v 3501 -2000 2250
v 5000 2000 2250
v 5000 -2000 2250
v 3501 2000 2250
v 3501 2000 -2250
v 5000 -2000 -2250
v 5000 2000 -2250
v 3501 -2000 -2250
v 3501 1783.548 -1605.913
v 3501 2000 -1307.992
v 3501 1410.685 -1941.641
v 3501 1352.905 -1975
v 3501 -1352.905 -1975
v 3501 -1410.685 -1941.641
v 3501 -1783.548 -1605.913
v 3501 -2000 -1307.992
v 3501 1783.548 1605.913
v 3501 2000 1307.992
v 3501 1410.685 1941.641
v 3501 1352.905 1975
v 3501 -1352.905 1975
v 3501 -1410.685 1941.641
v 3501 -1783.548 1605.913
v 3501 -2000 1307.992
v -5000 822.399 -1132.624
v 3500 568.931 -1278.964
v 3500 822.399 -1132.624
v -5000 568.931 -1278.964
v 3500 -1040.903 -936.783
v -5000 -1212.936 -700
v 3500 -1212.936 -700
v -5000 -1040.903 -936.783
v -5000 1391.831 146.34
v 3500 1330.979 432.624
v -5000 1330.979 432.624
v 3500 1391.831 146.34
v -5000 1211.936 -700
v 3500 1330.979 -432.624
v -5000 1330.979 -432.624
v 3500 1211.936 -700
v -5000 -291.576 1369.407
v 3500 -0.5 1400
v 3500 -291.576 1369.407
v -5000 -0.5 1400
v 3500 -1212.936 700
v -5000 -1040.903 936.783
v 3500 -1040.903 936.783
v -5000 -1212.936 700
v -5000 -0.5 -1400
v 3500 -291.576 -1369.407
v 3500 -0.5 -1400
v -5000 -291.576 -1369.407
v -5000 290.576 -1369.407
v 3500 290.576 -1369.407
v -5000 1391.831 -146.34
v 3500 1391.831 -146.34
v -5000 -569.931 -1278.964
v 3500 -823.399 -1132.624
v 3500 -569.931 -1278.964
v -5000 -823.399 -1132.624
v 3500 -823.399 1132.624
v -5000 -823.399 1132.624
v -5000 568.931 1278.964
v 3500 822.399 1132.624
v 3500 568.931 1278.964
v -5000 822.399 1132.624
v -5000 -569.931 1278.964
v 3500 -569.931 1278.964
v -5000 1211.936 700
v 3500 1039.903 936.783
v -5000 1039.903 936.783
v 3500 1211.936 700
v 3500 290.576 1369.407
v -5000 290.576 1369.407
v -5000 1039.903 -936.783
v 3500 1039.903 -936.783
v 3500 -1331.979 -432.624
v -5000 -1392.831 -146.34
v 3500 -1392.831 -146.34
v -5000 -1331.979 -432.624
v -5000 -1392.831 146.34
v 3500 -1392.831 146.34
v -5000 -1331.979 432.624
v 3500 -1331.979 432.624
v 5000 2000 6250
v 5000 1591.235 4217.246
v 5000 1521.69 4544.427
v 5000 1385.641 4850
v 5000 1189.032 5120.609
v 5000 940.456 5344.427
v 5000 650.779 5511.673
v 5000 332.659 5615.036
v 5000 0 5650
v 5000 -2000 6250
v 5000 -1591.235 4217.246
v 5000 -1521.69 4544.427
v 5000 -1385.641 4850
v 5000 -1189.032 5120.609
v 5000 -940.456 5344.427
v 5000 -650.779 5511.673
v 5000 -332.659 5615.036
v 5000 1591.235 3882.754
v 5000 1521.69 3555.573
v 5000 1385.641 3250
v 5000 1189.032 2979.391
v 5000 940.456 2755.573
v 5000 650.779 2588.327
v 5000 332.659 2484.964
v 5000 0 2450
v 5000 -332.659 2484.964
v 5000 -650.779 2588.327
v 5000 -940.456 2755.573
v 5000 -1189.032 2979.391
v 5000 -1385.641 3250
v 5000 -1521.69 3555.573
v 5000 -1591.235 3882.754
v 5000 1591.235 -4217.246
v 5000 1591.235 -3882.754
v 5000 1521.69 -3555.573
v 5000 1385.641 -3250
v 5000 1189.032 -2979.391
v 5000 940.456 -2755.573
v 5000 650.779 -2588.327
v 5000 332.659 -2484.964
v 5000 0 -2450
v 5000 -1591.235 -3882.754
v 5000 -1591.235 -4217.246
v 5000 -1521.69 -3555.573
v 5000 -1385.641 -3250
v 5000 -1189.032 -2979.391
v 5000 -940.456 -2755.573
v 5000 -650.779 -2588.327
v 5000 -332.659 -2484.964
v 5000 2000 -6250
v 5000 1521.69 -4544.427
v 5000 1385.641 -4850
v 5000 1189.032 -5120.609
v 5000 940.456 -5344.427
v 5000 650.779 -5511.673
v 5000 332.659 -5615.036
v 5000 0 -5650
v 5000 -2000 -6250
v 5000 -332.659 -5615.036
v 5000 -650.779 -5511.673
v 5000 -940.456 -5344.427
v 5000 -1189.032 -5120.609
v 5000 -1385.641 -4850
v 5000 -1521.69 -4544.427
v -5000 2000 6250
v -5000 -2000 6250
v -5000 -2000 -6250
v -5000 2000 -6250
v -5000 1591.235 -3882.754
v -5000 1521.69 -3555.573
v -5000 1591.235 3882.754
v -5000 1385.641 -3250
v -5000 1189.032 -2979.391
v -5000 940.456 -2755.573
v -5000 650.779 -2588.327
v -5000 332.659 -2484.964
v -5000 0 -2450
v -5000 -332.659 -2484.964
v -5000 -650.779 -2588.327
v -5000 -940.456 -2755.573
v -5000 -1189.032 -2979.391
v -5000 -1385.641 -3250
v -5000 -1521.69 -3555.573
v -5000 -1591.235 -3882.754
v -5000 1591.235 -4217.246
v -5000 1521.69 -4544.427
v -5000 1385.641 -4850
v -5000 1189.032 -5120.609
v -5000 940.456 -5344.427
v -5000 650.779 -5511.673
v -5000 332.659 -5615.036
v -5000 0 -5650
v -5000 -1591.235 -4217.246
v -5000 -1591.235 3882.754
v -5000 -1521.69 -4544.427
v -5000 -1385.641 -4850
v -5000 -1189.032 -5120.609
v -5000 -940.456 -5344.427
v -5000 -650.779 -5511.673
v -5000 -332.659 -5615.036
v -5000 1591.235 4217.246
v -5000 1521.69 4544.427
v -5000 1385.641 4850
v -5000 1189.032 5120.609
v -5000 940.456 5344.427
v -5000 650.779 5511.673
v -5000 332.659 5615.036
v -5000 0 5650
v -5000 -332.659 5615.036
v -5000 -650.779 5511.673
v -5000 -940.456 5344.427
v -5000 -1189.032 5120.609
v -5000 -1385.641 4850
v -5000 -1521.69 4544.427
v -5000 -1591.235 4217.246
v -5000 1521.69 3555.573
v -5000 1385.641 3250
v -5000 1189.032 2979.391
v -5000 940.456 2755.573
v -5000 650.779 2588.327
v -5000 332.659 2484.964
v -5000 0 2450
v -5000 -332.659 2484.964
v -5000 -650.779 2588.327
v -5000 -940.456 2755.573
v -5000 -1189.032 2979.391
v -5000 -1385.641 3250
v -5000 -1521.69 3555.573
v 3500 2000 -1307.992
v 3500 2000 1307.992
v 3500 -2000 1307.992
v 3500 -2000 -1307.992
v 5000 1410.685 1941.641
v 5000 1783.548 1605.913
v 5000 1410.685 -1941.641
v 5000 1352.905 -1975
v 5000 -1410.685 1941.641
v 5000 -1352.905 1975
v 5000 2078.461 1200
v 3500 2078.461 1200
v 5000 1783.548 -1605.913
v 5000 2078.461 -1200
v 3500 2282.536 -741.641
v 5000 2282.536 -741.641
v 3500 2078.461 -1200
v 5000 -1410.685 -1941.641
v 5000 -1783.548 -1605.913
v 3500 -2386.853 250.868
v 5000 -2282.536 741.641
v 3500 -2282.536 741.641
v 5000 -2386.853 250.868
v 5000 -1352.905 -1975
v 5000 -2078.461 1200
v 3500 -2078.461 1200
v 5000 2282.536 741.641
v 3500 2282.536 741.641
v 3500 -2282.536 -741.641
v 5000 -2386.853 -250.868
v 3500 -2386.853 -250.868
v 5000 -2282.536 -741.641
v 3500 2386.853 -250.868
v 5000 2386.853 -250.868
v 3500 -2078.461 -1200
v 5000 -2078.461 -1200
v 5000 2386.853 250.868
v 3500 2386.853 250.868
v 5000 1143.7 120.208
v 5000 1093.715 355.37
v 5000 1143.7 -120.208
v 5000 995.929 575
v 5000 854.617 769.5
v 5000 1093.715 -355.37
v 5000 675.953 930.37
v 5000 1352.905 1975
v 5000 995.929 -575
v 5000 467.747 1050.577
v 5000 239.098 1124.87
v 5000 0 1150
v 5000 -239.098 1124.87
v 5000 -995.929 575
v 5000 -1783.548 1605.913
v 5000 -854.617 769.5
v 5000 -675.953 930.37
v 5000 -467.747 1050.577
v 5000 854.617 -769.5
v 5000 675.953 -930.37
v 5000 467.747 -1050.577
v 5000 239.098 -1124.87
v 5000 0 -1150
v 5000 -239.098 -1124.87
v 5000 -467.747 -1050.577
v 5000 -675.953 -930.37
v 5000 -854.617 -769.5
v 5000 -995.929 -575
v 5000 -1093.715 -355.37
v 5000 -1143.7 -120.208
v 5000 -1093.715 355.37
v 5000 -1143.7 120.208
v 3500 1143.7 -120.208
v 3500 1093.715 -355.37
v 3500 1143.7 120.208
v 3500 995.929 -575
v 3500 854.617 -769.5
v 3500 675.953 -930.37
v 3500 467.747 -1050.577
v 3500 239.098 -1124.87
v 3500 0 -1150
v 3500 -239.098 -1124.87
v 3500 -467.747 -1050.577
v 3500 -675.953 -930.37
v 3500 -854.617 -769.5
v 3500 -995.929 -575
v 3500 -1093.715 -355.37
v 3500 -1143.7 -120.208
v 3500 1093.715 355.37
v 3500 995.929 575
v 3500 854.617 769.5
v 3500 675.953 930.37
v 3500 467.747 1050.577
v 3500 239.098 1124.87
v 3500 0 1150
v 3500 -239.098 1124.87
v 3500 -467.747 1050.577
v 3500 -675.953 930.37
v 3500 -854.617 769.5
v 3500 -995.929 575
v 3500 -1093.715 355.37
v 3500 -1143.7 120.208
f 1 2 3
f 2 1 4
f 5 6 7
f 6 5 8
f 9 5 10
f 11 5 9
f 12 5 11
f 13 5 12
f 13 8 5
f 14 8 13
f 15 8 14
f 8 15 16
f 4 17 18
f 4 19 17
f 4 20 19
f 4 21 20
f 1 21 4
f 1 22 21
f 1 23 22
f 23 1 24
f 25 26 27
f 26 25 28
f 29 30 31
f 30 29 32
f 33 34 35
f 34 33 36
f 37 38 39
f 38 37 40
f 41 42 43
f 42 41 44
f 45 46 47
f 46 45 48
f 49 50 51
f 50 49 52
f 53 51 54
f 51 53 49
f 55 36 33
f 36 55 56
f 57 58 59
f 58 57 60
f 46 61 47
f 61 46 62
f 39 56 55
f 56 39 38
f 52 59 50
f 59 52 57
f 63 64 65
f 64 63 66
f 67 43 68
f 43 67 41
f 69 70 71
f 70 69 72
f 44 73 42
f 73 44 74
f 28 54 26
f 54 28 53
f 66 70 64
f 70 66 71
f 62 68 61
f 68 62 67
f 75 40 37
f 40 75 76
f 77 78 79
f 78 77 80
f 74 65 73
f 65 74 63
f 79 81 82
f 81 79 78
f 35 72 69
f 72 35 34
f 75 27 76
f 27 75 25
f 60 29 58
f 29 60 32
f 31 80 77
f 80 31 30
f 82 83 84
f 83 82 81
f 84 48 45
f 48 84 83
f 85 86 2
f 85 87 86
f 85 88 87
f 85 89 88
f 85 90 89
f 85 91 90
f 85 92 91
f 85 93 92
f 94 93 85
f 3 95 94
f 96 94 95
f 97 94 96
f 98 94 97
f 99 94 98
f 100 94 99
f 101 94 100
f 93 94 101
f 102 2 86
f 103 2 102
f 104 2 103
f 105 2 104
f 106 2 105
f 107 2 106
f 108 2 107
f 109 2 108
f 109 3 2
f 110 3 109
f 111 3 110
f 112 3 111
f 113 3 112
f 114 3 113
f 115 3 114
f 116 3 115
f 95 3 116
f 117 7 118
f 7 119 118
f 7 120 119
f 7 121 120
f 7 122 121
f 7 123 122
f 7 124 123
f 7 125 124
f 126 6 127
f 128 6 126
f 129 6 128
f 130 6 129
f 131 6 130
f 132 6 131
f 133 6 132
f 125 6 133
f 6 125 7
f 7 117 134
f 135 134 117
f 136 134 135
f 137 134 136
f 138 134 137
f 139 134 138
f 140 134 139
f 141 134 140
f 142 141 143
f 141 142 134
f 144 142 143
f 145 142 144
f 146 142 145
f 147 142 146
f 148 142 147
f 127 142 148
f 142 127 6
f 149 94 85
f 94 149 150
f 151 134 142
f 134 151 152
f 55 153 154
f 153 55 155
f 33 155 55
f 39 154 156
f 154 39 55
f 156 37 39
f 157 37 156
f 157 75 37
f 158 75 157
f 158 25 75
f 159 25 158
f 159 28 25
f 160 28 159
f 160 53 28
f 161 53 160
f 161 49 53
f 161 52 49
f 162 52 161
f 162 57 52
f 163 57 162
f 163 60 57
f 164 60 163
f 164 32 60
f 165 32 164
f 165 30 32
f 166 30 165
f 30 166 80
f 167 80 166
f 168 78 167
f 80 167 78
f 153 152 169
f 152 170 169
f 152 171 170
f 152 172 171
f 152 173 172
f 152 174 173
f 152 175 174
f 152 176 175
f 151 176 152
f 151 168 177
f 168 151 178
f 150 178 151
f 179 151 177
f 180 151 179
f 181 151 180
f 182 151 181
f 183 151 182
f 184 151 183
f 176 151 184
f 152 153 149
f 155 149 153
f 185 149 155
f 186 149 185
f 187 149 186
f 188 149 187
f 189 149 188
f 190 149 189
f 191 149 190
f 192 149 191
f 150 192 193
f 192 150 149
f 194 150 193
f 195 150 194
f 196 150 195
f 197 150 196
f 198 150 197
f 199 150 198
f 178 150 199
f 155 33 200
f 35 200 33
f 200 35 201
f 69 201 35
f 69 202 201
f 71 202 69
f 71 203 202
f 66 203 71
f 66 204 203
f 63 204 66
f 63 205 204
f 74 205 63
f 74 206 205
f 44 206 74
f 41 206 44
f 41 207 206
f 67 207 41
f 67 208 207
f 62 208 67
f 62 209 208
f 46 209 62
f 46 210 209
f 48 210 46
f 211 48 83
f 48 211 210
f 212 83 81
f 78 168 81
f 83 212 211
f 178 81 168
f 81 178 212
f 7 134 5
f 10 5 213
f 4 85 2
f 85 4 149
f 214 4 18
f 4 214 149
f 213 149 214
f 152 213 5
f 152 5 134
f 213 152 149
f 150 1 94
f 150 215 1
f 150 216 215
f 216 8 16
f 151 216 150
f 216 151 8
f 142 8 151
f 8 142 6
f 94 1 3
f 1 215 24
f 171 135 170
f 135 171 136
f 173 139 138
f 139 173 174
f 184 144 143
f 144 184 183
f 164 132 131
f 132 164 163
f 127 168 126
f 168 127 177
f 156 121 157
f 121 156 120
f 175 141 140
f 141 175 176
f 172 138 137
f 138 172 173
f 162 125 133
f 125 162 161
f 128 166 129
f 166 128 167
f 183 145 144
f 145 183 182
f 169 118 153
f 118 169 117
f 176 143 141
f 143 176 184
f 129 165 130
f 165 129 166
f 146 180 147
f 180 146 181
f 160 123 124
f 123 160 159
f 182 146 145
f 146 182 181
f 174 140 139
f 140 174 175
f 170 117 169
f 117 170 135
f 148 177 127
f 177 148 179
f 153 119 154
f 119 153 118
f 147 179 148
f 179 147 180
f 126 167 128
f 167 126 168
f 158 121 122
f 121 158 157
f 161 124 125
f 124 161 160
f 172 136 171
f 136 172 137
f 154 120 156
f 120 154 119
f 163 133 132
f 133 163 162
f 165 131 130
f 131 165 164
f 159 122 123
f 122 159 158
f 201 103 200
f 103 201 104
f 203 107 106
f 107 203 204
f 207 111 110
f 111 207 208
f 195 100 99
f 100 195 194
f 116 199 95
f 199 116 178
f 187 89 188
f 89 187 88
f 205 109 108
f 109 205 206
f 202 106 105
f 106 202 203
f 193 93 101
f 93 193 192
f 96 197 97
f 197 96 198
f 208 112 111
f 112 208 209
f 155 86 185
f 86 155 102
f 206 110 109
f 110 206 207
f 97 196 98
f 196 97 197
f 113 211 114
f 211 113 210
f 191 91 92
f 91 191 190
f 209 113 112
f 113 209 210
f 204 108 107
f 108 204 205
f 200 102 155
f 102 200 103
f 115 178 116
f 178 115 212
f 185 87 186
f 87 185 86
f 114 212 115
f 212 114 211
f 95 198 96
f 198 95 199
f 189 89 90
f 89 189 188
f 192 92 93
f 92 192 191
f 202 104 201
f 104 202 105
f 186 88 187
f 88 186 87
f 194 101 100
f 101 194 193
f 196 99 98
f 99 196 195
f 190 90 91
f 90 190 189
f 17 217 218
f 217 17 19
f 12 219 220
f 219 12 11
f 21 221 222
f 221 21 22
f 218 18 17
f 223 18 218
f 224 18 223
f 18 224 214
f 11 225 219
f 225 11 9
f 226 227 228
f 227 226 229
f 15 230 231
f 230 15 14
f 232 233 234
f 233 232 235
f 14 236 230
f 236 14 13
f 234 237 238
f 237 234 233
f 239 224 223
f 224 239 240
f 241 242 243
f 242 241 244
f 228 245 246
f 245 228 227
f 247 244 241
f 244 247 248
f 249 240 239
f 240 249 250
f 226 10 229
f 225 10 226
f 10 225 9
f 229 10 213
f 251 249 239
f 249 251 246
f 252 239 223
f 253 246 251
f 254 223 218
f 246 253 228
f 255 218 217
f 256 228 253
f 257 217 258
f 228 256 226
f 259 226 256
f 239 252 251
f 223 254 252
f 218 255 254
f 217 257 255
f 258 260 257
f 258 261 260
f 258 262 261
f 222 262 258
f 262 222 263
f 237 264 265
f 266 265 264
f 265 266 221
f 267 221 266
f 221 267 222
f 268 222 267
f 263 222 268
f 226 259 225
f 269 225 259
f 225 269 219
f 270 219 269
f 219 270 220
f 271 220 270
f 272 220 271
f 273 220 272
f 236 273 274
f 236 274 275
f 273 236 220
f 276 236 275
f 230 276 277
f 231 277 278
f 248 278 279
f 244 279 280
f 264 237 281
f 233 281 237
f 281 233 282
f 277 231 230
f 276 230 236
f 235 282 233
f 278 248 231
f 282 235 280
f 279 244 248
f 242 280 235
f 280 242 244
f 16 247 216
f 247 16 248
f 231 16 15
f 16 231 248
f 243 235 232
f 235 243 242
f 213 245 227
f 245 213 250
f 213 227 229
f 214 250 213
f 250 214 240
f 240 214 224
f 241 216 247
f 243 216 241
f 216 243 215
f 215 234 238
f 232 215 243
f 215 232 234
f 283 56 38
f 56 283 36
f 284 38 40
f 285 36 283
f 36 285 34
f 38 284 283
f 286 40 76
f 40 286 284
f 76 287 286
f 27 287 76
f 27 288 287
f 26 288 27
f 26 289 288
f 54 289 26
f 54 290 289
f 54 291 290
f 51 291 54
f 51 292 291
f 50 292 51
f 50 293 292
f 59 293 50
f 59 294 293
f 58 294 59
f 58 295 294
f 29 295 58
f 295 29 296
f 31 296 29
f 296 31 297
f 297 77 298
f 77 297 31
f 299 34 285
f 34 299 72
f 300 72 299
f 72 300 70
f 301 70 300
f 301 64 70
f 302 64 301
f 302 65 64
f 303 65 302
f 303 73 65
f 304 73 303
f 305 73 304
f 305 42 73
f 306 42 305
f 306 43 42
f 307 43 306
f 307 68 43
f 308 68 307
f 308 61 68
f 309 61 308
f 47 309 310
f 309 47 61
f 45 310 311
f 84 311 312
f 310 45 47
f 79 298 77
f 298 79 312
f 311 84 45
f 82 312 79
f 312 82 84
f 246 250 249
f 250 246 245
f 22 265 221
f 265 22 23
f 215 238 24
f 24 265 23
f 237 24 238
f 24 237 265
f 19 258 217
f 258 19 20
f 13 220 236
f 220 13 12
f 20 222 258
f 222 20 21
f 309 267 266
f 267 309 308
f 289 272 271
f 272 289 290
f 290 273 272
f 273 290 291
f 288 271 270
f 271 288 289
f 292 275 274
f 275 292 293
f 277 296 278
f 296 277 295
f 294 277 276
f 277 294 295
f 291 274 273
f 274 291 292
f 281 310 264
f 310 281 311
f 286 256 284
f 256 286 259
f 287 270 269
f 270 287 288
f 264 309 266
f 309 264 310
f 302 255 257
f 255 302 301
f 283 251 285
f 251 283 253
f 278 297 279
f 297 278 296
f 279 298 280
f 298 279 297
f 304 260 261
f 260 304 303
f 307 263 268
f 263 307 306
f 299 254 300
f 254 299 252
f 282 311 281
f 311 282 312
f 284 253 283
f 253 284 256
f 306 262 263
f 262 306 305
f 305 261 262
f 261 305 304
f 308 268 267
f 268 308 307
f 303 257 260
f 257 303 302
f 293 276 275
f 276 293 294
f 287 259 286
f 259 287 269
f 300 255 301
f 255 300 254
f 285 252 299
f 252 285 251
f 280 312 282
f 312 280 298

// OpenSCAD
// file: BallNut.scad
module BallNutSquare(r=600, h=800) {
  difference() {
    intersection() {
      cube([3000, 3000, h], center=true);
      cylinder(h, 2000, 2000, center=true);
    }
    cylinder(h + 1, r + 300, r + 300, center=true);
  }
}

module BallNutRound(r=800, h=1000) {
  difference() {
    intersection() {
      cylinder(r=2400, h=h, center=true);
      cube([3950, 5000, h], center=true);
    }
    cylinder(h + 1, r + 350, r + 350, center=true);
  }
}

BallNutSquare();
// main file
use <BallNut.scad>;

module XAxisBearingBlock(r_guide=1000, r_screw=800, h=12500, w=10000, center=true) {
  l = r_guide * 4;
  
  r_guide_bearing = r_guide * 1.6;

  ballBearingCutoutDepth = 1500;
  ballBearingCutoutHeight = 4500;
  ballBearingCutoutRadius = 1400;

  centroid = center ? [-w/2, -l/2, -h/2] : [0, 0, 0];
  translate(centroid) {
    difference() {
      cube([w, l, h]);
      translate([-1, l / 2, r_guide * 2 + 200]) rotate([0, 90, 0]) {
        cylinder(w + 2, r_guide_bearing, r_guide_bearing);
      }
      translate([-1, l / 2, h - (r_guide * 2 + 200)]) rotate([0, 90, 0]) {
        cylinder(w + 2, r_guide_bearing, r_guide_bearing);
      }
      // Ball bearing cutout.
      translate([w - ballBearingCutoutDepth + 1, -0.5, (h - ballBearingCutoutHeight) / 2]) {
        cube([ballBearingCutoutDepth, l + 1, ballBearingCutoutHeight]);
        translate([-(w - ballBearingCutoutDepth + 2), l / 2, ballBearingCutoutHeight / 2]) rotate([0, 90, 0]) {
          cylinder(w + 2, ballBearingCutoutRadius, ballBearingCutoutRadius);
        }
      }
    }
    translate([w - ballBearingCutoutDepth / 2, l / 2, h / 2]) rotate([0, 90, 0]) {
      BallNutRound(r=r_screw, h=ballBearingCutoutDepth);
    }
  }
}

XAxisBearingBlock();
